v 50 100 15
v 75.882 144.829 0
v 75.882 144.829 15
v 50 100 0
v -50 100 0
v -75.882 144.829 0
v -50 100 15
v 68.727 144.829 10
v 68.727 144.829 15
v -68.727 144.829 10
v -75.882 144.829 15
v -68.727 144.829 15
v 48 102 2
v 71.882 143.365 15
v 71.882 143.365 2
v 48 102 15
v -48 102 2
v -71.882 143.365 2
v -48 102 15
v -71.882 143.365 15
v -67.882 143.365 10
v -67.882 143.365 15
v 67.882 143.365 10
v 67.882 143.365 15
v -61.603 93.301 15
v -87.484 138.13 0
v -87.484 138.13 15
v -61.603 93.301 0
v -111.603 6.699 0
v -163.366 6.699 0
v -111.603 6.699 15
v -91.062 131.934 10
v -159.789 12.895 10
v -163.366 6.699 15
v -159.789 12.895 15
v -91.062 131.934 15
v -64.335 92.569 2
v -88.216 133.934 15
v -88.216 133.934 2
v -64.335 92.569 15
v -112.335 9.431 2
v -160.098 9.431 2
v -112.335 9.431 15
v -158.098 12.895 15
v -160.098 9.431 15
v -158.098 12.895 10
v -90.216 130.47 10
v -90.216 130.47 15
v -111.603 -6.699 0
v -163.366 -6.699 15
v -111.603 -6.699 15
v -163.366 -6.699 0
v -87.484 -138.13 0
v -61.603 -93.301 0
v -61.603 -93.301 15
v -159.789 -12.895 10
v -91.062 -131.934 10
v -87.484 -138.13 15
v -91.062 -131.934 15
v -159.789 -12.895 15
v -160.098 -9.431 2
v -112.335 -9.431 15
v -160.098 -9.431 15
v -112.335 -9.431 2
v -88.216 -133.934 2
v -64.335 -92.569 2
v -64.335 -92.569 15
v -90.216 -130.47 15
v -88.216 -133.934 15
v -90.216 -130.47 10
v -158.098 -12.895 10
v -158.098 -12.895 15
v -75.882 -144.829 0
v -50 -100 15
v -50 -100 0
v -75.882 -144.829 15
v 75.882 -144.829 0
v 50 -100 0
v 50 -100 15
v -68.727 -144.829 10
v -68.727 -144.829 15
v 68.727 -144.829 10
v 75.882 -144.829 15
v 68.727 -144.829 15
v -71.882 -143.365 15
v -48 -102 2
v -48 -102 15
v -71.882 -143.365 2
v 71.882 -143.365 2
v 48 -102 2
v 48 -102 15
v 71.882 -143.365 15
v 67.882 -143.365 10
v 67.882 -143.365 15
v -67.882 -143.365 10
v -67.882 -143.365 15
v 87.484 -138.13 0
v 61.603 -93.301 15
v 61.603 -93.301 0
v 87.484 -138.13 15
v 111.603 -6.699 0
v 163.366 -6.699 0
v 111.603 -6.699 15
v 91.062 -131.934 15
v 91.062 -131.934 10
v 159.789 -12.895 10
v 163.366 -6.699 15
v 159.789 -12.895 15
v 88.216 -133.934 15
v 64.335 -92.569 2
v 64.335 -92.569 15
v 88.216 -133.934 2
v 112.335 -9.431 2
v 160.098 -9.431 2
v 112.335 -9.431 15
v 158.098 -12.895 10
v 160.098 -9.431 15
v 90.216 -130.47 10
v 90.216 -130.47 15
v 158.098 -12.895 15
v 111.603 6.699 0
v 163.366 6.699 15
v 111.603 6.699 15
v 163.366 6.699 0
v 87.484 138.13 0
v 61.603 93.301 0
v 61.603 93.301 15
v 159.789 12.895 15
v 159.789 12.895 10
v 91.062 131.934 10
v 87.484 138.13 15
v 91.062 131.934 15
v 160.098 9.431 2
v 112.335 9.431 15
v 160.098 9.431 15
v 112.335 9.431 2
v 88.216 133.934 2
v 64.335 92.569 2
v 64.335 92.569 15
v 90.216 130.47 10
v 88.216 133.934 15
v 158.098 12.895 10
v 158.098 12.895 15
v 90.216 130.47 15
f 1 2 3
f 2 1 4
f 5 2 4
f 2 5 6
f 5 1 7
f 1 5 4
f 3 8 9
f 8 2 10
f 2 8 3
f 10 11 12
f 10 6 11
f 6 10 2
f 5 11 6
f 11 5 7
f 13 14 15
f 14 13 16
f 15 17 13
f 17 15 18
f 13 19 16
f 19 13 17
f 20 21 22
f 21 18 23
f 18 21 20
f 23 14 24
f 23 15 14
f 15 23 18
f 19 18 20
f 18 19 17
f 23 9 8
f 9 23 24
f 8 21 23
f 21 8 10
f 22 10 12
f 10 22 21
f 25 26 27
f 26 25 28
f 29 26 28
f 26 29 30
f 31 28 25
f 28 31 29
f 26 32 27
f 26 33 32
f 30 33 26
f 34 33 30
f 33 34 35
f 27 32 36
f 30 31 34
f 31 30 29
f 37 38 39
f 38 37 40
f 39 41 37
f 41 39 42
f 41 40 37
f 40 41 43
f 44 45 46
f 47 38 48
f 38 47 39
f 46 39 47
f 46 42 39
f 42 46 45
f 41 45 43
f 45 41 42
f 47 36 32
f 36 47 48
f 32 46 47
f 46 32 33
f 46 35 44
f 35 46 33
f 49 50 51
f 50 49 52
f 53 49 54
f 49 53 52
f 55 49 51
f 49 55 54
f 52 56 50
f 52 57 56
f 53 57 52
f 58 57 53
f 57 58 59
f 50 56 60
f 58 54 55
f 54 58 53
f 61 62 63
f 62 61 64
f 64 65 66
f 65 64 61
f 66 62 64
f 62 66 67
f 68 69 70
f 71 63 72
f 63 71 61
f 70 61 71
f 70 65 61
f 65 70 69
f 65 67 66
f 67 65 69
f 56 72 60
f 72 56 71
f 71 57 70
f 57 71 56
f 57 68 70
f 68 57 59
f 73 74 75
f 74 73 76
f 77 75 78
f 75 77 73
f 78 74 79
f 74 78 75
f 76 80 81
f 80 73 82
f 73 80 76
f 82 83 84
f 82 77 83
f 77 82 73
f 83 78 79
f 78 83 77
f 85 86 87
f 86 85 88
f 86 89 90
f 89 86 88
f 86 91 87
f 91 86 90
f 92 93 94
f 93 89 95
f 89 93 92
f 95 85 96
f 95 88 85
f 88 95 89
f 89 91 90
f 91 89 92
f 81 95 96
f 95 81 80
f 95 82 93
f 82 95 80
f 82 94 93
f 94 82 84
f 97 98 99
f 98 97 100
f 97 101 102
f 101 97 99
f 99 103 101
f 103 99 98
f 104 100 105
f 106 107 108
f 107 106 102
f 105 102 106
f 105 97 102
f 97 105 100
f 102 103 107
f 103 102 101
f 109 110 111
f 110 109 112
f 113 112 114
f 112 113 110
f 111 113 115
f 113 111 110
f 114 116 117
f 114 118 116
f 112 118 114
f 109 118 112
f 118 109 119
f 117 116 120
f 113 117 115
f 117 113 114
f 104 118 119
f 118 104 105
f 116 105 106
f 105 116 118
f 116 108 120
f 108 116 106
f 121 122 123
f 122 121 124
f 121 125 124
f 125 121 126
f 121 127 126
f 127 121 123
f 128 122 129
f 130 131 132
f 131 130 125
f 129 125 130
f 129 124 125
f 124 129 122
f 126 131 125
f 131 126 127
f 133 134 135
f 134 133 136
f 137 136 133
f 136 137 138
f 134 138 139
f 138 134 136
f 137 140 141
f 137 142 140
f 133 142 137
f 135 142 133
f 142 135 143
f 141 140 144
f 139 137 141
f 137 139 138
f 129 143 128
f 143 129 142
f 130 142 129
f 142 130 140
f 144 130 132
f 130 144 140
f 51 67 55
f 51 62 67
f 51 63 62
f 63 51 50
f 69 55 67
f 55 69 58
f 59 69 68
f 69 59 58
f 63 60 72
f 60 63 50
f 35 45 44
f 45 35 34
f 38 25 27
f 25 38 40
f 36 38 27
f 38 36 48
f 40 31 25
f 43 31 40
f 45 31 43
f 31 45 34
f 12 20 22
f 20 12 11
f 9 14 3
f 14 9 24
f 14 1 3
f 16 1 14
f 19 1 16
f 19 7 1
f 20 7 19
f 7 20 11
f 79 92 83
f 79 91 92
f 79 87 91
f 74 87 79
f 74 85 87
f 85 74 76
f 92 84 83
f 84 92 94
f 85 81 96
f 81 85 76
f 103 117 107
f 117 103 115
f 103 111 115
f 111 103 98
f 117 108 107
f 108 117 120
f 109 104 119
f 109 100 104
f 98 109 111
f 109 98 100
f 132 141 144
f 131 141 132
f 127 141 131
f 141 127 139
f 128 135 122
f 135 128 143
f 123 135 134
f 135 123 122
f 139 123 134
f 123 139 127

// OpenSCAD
parts = 6;
angle = 360/parts;
l = 100;
h = 50;
a = h/tan(75);
side_l = sqrt(h*h+a*a);
s = 2;
edge_w = 8;
w = 30;
echo(l);
echo(angle);
echo(a);
echo(side_l);

difference(){
for(ang = [0 : angle : 360]) {
    rotate([0,0,ang]) translate([-l/2,l,0]) {
        difference(){
            linear_extrude(w) polygon([[0,0],[l,0],[l+sin(angle/2)*side_l,cos(angle/2)*side_l],[0-sin(angle/2)*side_l,cos(angle/2)*side_l]]);
            translate([s,s,s])linear_extrude(w-2*s) polygon([[0,0],[l-2*s,0],[l-2*s+sin(angle/2)*(side_l-2*s),cos(angle/2)*(side_l-2*s)],[0-sin(angle/2)*(side_l-2*s),cos(angle/2)*(side_l-2*s)]]);
            translate([s,s,s+edge_w])linear_extrude(w-2*edge_w-2*s) polygon([[edge_w/2,0],[l-edge_w/2-2*s,0],[l-edge_w/2-2*s+sin(angle/2)*(side_l),cos(angle/2)*(side_l)],[edge_w/2-sin(angle/2)*(side_l),cos(angle/2)*(side_l)]]);
            }
        }
}

translate([-500,-500,w/2])cube([1000,1000,1000]);

}
